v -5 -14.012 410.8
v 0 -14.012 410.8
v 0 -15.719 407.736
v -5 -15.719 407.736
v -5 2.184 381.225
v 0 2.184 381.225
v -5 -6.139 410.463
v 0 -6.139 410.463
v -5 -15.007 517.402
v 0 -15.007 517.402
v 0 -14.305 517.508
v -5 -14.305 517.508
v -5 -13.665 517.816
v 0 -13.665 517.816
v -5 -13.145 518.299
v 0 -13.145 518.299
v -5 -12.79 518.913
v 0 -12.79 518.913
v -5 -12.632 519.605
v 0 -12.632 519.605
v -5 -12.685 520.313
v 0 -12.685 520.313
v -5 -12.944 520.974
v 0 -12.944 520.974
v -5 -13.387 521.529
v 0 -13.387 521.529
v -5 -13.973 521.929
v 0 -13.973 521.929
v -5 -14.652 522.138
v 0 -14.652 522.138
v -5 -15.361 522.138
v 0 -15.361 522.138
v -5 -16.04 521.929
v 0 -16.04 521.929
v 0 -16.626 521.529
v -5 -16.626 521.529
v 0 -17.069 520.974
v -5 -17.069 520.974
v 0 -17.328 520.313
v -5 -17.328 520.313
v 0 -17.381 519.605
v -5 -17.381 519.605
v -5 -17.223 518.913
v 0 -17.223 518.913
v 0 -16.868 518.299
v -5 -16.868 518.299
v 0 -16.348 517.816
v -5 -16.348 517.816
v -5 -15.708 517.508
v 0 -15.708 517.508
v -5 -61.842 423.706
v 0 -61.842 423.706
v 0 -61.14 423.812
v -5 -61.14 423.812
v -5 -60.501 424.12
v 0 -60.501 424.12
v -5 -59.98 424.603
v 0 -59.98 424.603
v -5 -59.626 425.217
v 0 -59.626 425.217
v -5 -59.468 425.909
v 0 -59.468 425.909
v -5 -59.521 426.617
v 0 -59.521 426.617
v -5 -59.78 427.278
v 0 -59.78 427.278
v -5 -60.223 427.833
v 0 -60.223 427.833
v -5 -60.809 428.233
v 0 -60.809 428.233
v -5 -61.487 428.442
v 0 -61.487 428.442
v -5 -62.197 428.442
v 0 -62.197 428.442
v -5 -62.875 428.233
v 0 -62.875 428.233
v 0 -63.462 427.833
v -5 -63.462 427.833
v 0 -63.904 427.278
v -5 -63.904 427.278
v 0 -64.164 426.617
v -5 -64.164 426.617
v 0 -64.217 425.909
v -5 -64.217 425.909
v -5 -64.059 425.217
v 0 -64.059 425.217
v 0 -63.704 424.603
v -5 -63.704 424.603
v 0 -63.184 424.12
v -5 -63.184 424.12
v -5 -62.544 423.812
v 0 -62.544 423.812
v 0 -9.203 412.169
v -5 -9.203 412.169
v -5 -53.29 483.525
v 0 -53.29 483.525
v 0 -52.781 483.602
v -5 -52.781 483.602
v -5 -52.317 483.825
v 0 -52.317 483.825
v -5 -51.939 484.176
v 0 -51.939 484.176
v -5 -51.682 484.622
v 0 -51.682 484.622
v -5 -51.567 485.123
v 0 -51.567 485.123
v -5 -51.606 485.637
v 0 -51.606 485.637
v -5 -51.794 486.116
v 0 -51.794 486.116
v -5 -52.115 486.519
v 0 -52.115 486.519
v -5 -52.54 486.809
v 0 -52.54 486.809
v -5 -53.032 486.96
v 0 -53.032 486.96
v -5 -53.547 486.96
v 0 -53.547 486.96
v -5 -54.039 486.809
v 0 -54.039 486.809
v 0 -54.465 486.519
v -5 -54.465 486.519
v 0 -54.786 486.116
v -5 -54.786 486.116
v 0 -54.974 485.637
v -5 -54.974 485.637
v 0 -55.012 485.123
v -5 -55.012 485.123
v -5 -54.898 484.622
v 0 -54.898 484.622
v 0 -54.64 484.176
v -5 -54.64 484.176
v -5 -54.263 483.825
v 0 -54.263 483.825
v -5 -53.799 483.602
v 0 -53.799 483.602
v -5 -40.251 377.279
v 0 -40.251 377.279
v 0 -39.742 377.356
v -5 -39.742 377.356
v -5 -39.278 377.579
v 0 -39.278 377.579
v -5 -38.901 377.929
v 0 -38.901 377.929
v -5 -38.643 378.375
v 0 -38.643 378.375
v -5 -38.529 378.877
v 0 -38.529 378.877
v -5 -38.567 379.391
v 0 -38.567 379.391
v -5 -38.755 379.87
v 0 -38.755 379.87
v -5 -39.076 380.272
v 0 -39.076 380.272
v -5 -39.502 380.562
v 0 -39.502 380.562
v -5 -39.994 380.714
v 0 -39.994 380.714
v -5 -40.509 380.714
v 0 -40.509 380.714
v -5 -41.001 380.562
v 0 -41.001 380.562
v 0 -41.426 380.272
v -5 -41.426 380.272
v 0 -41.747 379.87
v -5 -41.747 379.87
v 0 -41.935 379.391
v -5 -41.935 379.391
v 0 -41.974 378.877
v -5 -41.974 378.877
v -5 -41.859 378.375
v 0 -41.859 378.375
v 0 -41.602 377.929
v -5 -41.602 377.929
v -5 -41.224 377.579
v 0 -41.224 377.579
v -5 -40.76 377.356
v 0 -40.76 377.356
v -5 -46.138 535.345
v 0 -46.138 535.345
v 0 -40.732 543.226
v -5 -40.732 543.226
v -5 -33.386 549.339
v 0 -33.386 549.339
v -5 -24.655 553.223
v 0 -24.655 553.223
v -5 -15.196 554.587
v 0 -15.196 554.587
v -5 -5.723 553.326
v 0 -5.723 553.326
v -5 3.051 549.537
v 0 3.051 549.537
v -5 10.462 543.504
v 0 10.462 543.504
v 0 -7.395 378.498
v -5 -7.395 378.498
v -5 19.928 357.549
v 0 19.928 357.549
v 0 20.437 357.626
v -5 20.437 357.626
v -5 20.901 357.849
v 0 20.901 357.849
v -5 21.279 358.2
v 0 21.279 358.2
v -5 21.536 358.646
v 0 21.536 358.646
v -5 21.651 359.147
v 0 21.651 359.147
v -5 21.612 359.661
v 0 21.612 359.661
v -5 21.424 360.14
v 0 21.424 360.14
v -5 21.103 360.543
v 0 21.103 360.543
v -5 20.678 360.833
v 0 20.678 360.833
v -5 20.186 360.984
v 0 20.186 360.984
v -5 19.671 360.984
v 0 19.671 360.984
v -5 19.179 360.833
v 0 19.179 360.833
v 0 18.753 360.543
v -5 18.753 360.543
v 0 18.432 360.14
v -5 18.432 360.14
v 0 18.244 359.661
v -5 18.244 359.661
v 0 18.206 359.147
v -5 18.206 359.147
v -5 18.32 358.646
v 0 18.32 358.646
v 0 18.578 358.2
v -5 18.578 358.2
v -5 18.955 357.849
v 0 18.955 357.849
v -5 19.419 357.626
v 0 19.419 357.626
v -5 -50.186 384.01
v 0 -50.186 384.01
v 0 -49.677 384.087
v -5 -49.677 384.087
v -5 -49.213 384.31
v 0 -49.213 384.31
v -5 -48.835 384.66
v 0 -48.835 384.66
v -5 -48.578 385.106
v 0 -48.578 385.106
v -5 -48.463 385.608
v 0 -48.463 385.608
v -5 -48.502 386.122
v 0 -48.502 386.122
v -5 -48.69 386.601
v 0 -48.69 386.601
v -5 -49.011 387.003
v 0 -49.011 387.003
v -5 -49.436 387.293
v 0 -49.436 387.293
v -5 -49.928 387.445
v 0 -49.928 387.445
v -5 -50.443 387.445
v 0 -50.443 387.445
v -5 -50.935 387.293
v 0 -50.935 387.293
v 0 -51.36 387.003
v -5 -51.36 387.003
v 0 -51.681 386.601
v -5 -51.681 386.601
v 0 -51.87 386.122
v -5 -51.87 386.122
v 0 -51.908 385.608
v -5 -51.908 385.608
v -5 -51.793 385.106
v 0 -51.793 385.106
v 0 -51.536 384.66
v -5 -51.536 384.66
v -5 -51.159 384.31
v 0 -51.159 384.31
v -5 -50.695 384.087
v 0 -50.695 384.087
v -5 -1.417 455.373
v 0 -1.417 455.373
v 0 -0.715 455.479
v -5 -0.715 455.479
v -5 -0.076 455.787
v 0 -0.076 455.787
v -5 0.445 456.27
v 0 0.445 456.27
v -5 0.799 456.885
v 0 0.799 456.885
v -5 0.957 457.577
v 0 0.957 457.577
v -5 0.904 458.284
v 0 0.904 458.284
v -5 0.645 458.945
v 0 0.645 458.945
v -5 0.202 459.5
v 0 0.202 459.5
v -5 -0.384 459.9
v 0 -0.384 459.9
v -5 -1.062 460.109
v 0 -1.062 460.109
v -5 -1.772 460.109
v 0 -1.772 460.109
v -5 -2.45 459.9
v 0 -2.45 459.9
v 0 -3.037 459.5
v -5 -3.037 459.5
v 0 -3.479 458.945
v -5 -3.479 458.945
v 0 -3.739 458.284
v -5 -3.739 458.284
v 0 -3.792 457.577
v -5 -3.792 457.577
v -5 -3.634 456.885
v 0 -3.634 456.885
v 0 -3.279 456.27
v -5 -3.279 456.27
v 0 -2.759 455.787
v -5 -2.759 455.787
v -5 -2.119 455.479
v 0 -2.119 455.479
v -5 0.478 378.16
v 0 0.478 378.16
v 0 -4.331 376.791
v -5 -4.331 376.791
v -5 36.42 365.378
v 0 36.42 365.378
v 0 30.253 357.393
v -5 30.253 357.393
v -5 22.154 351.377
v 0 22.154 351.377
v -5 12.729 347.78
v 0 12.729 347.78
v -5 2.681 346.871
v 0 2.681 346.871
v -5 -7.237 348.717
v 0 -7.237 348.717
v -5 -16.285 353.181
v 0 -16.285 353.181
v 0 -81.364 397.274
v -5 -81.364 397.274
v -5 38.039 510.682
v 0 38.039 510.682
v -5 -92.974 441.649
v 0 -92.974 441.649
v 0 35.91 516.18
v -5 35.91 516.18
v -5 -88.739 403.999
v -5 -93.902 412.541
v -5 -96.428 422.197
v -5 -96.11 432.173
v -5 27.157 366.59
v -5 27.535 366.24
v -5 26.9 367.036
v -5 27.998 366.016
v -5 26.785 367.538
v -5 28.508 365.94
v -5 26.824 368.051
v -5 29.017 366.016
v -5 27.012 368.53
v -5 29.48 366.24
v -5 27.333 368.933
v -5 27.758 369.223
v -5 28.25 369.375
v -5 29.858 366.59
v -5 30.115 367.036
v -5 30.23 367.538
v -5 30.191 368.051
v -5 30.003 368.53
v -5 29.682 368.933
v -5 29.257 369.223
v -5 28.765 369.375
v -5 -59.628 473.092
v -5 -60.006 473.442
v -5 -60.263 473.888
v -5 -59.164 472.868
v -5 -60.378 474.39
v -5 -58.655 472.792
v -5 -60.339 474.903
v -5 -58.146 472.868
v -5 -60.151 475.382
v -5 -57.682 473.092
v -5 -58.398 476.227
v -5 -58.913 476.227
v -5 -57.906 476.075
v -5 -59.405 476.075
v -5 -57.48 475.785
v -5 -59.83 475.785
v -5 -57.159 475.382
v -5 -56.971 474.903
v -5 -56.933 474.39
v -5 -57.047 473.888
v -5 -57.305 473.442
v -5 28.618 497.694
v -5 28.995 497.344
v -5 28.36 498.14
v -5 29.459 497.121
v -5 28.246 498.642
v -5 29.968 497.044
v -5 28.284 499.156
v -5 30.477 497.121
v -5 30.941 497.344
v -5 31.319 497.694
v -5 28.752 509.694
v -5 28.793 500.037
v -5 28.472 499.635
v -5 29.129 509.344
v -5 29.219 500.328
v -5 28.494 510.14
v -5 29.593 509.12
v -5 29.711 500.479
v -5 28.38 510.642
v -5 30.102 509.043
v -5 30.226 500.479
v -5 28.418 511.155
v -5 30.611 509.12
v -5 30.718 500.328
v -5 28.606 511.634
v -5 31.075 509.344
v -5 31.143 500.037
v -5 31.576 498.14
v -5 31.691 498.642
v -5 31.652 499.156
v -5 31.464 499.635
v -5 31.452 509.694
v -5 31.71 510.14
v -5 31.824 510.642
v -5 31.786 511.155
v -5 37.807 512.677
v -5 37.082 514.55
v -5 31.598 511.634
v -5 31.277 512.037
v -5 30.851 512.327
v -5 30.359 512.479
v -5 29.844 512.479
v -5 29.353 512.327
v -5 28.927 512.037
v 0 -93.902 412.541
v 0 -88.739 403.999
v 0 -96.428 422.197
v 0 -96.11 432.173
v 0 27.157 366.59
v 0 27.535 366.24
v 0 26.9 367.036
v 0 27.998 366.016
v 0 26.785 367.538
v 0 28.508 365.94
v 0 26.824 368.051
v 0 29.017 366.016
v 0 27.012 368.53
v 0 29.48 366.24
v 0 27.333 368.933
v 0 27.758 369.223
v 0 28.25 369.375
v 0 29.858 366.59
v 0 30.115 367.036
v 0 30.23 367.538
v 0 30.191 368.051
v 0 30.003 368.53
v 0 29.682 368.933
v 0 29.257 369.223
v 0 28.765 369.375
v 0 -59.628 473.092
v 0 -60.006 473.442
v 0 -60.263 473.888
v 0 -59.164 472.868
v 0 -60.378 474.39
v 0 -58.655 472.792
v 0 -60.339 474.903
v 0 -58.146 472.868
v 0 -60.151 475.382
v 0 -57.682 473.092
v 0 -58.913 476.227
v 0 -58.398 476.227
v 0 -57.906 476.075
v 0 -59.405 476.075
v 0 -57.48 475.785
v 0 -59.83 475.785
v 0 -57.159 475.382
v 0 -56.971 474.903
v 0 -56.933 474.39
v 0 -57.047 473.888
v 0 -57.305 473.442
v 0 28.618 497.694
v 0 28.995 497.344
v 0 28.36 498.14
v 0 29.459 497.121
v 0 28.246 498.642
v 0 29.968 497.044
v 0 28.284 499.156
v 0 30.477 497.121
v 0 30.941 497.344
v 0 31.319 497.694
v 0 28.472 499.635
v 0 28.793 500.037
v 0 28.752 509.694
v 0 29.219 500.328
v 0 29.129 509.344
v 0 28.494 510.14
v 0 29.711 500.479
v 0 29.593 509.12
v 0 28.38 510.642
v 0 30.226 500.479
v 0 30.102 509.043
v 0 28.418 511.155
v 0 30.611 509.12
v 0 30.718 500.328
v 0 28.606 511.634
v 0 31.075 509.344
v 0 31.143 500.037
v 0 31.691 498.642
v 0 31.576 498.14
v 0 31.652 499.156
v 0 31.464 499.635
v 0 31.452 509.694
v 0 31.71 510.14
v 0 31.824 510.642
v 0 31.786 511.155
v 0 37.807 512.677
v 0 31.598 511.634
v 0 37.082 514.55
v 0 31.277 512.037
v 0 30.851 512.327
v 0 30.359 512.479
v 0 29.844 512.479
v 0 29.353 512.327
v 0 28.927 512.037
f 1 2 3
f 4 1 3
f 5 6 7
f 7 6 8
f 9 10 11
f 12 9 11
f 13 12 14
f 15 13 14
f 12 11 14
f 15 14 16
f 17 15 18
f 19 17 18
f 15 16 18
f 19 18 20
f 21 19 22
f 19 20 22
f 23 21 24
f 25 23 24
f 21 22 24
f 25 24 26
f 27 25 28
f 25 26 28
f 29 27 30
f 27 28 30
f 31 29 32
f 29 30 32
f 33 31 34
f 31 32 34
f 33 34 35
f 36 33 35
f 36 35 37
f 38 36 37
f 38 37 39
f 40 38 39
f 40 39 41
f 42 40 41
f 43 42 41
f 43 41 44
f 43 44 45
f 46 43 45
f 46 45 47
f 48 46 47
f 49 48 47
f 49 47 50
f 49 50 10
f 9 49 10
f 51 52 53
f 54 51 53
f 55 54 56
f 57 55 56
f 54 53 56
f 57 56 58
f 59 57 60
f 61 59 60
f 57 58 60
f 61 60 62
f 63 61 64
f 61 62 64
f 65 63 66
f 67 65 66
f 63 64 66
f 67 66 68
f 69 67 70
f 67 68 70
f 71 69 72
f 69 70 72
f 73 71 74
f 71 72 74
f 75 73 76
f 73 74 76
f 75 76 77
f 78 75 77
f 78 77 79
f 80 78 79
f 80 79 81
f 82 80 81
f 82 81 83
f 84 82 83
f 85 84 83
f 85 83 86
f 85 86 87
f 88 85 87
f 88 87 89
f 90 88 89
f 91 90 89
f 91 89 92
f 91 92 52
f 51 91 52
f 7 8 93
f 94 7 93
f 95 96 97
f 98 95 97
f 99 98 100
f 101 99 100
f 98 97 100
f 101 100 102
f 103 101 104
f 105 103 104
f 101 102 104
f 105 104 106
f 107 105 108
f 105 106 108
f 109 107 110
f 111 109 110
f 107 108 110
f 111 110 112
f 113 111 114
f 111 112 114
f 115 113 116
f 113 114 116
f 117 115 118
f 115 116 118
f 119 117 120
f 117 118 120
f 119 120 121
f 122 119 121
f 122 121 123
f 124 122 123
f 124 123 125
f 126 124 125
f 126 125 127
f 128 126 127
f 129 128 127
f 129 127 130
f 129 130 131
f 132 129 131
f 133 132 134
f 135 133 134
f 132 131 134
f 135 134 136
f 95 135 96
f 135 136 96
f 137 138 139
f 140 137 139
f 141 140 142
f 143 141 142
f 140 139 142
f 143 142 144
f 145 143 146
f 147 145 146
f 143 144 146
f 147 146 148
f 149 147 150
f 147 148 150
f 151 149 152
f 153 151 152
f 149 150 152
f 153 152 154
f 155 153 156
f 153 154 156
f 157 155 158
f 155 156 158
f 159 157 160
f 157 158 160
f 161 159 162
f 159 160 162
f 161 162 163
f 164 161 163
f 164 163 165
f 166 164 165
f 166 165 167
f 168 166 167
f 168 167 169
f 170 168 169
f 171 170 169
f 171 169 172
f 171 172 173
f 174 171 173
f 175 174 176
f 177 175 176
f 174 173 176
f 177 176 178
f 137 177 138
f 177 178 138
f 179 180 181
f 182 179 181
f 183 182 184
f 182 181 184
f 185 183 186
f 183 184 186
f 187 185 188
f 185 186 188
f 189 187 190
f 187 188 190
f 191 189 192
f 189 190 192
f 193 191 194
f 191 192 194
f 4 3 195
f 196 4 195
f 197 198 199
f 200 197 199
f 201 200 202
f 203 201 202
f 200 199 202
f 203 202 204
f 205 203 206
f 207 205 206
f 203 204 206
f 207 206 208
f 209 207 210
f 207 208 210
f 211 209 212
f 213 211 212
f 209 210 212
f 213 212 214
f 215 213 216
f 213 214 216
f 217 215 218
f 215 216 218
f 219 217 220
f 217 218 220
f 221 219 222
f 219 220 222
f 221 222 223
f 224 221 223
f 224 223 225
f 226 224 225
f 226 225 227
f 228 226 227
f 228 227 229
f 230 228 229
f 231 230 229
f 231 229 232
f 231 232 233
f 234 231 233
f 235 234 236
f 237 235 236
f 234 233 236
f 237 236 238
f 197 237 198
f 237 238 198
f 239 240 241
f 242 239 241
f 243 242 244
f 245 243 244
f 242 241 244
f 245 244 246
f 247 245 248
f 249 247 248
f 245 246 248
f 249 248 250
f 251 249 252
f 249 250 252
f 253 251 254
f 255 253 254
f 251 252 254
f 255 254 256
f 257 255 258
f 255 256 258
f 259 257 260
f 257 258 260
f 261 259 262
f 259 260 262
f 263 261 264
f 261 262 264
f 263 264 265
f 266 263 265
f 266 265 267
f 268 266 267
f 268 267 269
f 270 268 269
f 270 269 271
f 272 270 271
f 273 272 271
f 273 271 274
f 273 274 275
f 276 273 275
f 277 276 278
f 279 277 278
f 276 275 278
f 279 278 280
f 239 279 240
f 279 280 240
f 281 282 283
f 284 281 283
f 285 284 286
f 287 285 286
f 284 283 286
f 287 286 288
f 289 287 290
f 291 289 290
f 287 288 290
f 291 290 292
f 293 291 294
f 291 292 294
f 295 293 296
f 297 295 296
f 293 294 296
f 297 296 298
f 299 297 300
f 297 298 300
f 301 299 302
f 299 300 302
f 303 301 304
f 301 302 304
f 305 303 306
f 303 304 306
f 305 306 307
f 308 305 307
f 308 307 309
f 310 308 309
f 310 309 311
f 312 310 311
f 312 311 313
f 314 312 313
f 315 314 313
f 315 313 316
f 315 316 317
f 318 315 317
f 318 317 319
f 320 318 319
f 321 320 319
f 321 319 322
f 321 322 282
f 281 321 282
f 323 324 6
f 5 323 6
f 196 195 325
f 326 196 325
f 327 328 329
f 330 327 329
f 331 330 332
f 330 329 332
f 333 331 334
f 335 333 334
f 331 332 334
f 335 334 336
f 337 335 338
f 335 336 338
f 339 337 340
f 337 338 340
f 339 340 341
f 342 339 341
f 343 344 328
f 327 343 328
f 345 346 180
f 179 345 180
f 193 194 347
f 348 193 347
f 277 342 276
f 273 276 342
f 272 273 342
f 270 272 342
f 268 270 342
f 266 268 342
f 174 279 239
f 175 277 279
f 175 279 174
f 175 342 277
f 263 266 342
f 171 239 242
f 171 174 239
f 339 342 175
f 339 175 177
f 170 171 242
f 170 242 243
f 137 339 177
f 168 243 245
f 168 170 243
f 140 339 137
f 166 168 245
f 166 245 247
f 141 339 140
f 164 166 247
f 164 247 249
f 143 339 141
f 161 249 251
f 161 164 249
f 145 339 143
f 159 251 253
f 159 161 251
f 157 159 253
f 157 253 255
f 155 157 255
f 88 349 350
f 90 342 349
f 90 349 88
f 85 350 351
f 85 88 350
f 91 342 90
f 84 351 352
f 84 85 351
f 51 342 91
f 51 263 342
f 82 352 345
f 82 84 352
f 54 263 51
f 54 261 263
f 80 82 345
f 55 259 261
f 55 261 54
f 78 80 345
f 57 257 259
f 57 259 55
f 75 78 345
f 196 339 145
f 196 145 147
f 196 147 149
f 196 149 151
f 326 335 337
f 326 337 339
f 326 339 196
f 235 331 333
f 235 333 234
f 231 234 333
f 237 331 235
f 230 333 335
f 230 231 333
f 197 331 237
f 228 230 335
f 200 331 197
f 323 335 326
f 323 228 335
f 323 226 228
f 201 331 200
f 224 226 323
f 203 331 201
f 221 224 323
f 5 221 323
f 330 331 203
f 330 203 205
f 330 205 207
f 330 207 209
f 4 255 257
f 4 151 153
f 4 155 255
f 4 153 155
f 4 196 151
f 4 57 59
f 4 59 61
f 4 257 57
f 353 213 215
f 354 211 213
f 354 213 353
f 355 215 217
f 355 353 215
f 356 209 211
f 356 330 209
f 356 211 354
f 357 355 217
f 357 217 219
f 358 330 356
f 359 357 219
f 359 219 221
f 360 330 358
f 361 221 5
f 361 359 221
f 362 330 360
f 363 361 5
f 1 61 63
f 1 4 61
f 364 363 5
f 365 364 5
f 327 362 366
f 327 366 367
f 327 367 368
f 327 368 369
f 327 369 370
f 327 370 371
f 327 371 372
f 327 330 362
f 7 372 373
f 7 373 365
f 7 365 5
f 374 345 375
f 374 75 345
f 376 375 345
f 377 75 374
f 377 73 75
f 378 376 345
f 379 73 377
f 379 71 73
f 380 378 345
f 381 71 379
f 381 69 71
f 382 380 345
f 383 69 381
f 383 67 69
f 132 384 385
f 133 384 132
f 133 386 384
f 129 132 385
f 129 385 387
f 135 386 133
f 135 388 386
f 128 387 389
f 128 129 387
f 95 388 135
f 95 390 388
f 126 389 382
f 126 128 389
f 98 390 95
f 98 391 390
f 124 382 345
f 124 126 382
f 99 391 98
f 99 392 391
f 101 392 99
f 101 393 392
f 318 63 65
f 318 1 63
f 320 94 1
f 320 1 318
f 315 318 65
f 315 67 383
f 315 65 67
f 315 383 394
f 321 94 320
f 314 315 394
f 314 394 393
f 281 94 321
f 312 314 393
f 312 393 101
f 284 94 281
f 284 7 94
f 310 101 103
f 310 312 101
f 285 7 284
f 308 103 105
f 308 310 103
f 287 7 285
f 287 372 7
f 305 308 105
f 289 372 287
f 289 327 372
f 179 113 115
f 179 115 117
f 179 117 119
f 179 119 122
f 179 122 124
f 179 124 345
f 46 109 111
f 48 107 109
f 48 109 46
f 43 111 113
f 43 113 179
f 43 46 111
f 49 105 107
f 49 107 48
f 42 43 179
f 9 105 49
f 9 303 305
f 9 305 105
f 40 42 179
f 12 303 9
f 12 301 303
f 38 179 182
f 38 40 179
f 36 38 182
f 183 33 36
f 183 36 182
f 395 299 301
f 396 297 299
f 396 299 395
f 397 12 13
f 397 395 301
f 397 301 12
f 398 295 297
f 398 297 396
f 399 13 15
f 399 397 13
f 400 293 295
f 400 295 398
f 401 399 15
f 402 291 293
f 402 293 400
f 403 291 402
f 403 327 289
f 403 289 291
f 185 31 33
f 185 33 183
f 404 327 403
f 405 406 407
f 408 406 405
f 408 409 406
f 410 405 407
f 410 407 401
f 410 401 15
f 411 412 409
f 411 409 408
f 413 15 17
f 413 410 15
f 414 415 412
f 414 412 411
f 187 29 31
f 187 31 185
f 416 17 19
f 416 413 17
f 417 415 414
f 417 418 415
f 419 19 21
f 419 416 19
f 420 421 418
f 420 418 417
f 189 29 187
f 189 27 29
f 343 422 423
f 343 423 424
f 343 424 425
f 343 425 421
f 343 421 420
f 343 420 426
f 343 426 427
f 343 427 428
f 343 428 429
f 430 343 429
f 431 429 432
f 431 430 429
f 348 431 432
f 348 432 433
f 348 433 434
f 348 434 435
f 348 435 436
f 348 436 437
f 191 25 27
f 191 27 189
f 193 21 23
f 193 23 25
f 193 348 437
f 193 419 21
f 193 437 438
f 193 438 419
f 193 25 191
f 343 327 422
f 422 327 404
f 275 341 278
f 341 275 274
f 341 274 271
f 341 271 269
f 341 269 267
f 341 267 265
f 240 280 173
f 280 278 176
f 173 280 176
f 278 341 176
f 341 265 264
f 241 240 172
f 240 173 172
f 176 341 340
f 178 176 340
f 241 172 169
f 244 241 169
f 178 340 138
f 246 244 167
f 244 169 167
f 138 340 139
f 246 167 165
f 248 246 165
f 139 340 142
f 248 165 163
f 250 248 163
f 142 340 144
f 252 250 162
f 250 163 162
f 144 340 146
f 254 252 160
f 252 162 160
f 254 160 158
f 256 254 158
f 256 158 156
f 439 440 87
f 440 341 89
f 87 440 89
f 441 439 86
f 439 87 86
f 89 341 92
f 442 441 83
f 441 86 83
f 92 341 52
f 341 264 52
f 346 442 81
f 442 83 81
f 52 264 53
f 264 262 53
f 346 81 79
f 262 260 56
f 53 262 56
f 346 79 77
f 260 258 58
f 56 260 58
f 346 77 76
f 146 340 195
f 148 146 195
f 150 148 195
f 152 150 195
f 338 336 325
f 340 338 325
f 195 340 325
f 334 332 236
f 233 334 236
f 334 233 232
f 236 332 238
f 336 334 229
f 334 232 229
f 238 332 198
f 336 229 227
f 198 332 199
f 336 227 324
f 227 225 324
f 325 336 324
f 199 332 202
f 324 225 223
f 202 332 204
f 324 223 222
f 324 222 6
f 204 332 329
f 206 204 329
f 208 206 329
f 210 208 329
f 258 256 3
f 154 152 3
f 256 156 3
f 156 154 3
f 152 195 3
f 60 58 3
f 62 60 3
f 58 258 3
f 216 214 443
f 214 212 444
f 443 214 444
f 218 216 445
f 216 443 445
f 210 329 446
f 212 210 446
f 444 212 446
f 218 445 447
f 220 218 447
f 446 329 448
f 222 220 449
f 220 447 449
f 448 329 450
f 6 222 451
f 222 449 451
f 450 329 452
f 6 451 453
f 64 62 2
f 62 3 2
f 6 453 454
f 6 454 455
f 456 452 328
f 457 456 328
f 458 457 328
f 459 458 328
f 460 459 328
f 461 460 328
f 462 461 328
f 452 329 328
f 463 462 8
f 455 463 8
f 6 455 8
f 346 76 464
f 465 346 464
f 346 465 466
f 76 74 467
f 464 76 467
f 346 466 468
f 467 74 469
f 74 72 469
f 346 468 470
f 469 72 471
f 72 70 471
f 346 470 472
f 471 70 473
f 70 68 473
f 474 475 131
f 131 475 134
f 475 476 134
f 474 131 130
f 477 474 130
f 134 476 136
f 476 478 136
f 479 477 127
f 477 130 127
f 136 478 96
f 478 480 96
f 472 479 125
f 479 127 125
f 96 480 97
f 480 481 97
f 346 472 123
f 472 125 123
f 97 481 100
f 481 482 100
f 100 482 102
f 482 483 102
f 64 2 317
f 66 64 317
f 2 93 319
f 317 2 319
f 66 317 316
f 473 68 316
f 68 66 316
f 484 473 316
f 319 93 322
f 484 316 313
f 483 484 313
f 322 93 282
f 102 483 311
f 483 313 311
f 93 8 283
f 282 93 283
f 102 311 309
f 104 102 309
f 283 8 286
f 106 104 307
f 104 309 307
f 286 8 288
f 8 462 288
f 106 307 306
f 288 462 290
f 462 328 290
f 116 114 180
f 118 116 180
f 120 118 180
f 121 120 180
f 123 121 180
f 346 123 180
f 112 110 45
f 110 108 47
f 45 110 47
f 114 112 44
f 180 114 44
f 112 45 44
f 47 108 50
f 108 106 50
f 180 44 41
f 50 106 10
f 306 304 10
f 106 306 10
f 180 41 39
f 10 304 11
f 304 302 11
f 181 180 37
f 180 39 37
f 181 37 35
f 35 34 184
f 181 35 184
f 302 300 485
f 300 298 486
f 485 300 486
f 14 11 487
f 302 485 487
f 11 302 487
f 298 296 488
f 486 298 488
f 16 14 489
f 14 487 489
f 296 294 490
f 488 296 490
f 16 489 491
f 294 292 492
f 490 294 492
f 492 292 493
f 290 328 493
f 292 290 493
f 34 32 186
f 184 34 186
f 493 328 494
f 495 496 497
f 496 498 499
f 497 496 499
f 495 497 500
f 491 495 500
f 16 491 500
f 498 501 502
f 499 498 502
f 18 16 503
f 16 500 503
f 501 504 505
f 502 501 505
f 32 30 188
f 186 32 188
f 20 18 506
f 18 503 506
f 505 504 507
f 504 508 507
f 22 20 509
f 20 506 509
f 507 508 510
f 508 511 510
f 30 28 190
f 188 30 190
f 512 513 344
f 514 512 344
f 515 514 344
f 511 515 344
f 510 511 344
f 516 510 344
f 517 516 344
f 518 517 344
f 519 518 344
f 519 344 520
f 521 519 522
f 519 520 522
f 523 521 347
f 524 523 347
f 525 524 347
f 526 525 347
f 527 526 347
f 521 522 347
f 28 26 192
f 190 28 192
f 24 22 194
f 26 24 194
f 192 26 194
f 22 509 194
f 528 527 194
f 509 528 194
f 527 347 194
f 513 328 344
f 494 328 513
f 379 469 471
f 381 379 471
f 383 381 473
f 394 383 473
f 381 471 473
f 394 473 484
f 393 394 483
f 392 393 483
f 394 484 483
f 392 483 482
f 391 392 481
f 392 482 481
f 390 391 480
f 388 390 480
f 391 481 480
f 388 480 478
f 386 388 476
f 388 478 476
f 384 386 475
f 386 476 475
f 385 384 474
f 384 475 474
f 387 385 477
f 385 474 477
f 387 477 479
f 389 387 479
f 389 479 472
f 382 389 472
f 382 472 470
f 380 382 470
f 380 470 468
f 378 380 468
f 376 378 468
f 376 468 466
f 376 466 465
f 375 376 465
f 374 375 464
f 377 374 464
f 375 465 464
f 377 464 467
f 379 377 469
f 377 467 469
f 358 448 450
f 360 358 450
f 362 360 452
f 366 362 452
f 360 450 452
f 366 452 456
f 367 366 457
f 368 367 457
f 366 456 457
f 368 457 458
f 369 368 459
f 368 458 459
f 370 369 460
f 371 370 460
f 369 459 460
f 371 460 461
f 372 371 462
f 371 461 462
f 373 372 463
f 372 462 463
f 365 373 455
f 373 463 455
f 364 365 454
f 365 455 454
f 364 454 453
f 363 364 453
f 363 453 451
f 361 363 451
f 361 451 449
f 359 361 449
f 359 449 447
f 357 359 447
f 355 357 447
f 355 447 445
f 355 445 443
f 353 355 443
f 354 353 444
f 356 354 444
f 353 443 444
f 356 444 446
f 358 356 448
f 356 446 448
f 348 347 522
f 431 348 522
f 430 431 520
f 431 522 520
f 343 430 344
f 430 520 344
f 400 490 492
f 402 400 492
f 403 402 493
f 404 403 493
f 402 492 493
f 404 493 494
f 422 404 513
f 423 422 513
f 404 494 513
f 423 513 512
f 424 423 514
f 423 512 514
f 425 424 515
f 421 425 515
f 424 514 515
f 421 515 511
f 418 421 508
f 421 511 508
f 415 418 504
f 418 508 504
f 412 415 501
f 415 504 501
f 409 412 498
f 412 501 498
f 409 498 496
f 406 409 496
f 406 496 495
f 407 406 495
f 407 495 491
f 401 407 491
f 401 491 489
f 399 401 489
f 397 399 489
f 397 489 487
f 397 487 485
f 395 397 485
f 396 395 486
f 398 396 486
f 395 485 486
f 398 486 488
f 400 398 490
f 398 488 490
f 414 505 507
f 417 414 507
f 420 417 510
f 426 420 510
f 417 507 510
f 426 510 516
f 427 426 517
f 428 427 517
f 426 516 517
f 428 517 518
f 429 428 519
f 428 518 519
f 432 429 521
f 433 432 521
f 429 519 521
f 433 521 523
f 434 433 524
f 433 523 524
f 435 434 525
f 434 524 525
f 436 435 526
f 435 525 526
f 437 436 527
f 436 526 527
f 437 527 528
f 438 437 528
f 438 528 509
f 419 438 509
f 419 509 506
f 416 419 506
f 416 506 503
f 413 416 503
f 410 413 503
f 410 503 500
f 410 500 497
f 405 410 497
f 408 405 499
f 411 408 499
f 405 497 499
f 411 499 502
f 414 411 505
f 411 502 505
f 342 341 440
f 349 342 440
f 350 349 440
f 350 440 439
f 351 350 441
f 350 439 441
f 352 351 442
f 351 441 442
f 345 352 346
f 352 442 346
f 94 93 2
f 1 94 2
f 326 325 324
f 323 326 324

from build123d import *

# Parameters (mm, degrees)
SKETCH4_R           = 1.7272
BOSS_EXTRUDE1_DEPTH = 5
SKETCH6_R           = 2.38125
CUT_EXTRUDE3_DEPTH  = 6


with BuildPart() as part:
    # Sketch4 → Boss-Extrude1 (new body)
    with BuildSketch(Plane(origin=(0, 0, 0), x_dir=(0, 0, -1), z_dir=(1, 0, 0))):
        with BuildLine():
            Line((-510.682190934, 38.038925927), (-365.377526066, 36.419992053))
            ThreePointArc((-365.377526066, 36.419992053), (-347.780080684, 12.728604031), (-353.180701811, -16.284931462))
            Line((-353.180701811, -16.284931462), (-397.273694981, -81.364150349))
            ThreePointArc((-397.273694981, -81.364150349), (-417.278222711, -95.513055214), (-441.64877195, -92.973573308))
            Line((-441.64877195, -92.973573308), (-535.34498696, -46.137884003))
            ThreePointArc((-535.34498696, -46.137884003), (-554.231450435, -19.972248852), (-543.504008498, 10.46228671))
            Line((-543.504008498, 10.46228671), (-516.180391889, 35.910386439))
            ThreePointArc((-516.180391889, 35.910386439), (-513.636251412, 37.504085531), (-510.682190934, 38.038925927))
        make_face()
        with Locations((-485.252549027, -53.289868312)):
            Circle(SKETCH4_R, mode=Mode.SUBTRACT)
        with Locations((-474.518853752, -58.65529334)):
            Circle(SKETCH4_R, mode=Mode.SUBTRACT)
        with Locations((-510.7706223, 30.101918548)):
            Circle(SKETCH4_R, mode=Mode.SUBTRACT)
        with Locations((-498.771367049, 29.968227033)):
            Circle(SKETCH4_R, mode=Mode.SUBTRACT)
        with Locations((-367.666774725, 28.507505411)):
            Circle(SKETCH4_R, mode=Mode.SUBTRACT)
        with Locations((-359.276554144, 19.928216477)):
            Circle(SKETCH4_R, mode=Mode.SUBTRACT)
        with Locations((-385.737171654, -50.185658721)):
            Circle(SKETCH4_R, mode=Mode.SUBTRACT)
        with Locations((-379.006254083, -40.251135649)):
            Circle(SKETCH4_R, mode=Mode.SUBTRACT)
    extrude(amount=-BOSS_EXTRUDE1_DEPTH)

    # Sketch6 → Cut-Extrude3 (cut, through all)
    with BuildSketch(Plane(origin=(0, 0, 0), x_dir=(0, 0, -1), z_dir=(1, 0, 0))):
        with Locations((-519.783421193, -15.006500358)):
            Circle(SKETCH6_R)
        with Locations((-457.75455229, -1.41718755)):
            Circle(SKETCH6_R)
        with Locations((-426.087206182, -61.842189663)):
            Circle(SKETCH6_R)
        Polygon((-410.800244566, -14.012433181), (-407.736158639, -15.718577512), (-378.497536933, -7.395218158), (-376.791392602, -4.331132231), (-378.160423785, 0.478053958), (-381.224509713, 2.184198289), (-410.463131418, -6.139161065), (-412.169275749, -9.203246993), align=None)
    extrude(amount=-CUT_EXTRUDE3_DEPTH, mode=Mode.SUBTRACT)


solid = part.part
